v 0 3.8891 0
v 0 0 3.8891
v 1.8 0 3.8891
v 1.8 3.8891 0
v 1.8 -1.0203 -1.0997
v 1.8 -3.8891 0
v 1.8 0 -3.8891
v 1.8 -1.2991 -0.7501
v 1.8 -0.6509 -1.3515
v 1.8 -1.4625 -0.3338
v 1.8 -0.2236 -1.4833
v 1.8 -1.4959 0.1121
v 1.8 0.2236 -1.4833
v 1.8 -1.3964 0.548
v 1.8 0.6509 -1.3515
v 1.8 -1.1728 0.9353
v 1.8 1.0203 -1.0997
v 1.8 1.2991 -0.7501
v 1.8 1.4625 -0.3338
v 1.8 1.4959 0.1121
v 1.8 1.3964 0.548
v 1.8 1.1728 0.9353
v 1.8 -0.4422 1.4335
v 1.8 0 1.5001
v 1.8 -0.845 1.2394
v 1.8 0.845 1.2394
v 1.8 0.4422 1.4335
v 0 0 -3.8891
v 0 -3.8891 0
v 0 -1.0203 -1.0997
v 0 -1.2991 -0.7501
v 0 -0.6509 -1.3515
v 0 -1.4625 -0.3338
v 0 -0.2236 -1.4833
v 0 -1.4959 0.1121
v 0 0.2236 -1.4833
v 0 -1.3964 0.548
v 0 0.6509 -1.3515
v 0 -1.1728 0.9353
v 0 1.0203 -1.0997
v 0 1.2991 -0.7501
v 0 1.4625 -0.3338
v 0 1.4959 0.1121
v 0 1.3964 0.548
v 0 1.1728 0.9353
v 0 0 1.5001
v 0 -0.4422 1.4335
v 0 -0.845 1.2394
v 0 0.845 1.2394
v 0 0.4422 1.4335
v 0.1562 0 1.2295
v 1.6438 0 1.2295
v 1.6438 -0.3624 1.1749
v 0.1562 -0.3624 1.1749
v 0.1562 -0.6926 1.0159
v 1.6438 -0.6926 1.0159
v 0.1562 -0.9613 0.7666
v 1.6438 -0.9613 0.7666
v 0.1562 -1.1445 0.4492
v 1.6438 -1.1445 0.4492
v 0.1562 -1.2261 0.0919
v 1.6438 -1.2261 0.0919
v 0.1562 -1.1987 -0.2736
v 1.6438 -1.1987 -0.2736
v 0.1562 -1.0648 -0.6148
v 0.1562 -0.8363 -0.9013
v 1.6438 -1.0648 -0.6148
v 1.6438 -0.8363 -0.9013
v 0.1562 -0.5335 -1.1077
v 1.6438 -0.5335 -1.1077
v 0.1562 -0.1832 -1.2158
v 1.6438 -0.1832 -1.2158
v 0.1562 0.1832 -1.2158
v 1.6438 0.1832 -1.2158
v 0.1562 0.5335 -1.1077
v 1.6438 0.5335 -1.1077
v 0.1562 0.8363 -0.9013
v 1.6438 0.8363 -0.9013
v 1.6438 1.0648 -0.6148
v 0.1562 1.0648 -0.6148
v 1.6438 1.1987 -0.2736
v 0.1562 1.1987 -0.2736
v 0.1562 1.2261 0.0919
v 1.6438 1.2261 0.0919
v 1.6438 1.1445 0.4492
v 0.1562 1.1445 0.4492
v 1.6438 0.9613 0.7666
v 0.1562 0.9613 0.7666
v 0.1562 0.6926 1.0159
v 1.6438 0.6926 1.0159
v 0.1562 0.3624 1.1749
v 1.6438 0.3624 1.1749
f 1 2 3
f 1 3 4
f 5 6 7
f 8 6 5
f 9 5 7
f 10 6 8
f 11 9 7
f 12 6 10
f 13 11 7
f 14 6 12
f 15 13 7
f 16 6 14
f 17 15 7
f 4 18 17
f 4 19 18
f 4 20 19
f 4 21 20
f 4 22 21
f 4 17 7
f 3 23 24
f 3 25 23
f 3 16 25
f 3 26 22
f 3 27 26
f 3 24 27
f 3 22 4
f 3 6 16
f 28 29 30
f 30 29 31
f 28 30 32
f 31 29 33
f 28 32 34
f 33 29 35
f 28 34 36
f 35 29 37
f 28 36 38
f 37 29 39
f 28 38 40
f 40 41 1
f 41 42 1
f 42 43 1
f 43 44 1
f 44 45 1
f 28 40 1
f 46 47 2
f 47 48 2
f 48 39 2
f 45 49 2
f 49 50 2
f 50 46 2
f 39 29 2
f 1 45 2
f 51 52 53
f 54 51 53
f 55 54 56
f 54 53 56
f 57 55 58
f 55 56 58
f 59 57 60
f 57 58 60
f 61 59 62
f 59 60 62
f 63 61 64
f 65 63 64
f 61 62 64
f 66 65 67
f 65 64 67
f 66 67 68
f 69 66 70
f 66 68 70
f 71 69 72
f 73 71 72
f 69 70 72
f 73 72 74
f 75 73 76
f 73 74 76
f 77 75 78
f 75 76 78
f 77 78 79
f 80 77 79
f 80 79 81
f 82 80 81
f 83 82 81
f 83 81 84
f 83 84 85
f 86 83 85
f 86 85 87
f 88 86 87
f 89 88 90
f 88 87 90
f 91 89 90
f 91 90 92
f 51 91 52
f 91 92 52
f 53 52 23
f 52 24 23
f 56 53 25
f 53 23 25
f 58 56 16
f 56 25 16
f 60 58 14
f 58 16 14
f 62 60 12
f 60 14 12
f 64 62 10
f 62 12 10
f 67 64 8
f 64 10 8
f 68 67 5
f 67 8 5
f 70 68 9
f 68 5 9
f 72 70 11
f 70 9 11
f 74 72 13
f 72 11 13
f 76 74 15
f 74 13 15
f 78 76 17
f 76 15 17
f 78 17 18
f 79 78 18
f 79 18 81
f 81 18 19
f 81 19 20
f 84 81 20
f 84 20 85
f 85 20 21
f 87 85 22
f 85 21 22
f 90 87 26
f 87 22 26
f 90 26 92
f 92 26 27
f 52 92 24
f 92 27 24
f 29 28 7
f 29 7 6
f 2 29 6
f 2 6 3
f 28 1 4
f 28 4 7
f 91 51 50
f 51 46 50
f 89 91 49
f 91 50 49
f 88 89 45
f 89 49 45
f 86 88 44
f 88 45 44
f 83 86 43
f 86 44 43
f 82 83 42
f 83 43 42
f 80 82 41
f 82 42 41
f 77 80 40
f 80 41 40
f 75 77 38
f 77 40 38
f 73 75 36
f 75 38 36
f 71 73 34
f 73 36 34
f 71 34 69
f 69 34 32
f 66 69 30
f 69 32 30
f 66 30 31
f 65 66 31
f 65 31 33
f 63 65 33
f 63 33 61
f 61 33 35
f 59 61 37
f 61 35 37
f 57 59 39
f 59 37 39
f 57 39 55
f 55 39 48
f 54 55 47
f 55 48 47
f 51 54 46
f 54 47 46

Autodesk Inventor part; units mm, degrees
ref_plane "YZ Plane" through (0, 0, 0) normal (1, 0, 0) x (0, 1, 0)
ref_plane "XZ Plane" through (0, 0, 0) normal (0, 1, 0) x (-1, 0, 0)
sketch "Skizze1" plane through (0, 0, 0) normal (1, 0, 0) x (0, 1, 0)
  line L0 (0, -3.8891) -> (-3.8891, 0)
  line L1 (-3.8891, 0) -> (0, 3.8891)
  line L2 (0, 3.8891) -> (3.8891, 0)
  line L3 (3.8891, 0) -> (0, -3.8891)
  line L4 (-5.4447, 0) -> (5.4447, 0) projected
  point P0 (0, 0)
  point P1 (0, 0)
  dimension "d0" = 7.7782
extrude "Körper" add sketch "Skizze1" along normal blind 1.8
sketch "Skizze2" plane through (0, 0, 0) normal (-1, 0, 0) x (0, 0, 1)
  point P0 (0, 0)
  point P1 (0, 0)
hole "Gewinde" at (0, 0, 0) direction (1, 0, 0) diameter 2.459 end through all thread size "M3x0.5" class "6H" standard "ISO Metric profile"
chamfer "Fase1" distance 0.2706 angle 30 1 edges at (0, 0, -1.2295) measured on face at (0, -1.5681, 1.6031)
chamfer "Fase2" distance 0.2706 angle 30 1 edges at (1.8, 0, -1.2295) measured on face at (1.8, -1.5681, 1.6031)
ref_plane "Work Plane1" through (11.1463, 0, 0) normal (0, 0.7071, -0.7071) x (-1, 0, 0)
equation "\"d0\" = 1.41421 * SW"
equation "\"d1\" = KOH"
equation "\"d3\" = -0.5 * GD1 + 0.5 * NND"
equation "\"d35\" = -0.5 * GD1 + 0.5 * NND"
equation "\"d5\" = -0.5 * GD1 + 0.5 * NND"
equation "\"d36\" = -0.5 * GD1 + 0.5 * NND"
equation "\"NND\" = 3"
equation "\"KOH\" = 1.8"
equation "\"SW\" = 5.5"
equation "\"GUL\" = 0.541266 * PTC"
equation "\"THREADDIA\" = 3"
equation "\"TOA\" = 30deg"
equation "\"PTC\" = 0.5"
equation "\"E0\" = 7"
equation "\"GAL\" = 0.541266 * PTC"
equation "\"GD1\" = 2.458734"
properties part number "DIN 562 - M3" material "Stahl, weich"
